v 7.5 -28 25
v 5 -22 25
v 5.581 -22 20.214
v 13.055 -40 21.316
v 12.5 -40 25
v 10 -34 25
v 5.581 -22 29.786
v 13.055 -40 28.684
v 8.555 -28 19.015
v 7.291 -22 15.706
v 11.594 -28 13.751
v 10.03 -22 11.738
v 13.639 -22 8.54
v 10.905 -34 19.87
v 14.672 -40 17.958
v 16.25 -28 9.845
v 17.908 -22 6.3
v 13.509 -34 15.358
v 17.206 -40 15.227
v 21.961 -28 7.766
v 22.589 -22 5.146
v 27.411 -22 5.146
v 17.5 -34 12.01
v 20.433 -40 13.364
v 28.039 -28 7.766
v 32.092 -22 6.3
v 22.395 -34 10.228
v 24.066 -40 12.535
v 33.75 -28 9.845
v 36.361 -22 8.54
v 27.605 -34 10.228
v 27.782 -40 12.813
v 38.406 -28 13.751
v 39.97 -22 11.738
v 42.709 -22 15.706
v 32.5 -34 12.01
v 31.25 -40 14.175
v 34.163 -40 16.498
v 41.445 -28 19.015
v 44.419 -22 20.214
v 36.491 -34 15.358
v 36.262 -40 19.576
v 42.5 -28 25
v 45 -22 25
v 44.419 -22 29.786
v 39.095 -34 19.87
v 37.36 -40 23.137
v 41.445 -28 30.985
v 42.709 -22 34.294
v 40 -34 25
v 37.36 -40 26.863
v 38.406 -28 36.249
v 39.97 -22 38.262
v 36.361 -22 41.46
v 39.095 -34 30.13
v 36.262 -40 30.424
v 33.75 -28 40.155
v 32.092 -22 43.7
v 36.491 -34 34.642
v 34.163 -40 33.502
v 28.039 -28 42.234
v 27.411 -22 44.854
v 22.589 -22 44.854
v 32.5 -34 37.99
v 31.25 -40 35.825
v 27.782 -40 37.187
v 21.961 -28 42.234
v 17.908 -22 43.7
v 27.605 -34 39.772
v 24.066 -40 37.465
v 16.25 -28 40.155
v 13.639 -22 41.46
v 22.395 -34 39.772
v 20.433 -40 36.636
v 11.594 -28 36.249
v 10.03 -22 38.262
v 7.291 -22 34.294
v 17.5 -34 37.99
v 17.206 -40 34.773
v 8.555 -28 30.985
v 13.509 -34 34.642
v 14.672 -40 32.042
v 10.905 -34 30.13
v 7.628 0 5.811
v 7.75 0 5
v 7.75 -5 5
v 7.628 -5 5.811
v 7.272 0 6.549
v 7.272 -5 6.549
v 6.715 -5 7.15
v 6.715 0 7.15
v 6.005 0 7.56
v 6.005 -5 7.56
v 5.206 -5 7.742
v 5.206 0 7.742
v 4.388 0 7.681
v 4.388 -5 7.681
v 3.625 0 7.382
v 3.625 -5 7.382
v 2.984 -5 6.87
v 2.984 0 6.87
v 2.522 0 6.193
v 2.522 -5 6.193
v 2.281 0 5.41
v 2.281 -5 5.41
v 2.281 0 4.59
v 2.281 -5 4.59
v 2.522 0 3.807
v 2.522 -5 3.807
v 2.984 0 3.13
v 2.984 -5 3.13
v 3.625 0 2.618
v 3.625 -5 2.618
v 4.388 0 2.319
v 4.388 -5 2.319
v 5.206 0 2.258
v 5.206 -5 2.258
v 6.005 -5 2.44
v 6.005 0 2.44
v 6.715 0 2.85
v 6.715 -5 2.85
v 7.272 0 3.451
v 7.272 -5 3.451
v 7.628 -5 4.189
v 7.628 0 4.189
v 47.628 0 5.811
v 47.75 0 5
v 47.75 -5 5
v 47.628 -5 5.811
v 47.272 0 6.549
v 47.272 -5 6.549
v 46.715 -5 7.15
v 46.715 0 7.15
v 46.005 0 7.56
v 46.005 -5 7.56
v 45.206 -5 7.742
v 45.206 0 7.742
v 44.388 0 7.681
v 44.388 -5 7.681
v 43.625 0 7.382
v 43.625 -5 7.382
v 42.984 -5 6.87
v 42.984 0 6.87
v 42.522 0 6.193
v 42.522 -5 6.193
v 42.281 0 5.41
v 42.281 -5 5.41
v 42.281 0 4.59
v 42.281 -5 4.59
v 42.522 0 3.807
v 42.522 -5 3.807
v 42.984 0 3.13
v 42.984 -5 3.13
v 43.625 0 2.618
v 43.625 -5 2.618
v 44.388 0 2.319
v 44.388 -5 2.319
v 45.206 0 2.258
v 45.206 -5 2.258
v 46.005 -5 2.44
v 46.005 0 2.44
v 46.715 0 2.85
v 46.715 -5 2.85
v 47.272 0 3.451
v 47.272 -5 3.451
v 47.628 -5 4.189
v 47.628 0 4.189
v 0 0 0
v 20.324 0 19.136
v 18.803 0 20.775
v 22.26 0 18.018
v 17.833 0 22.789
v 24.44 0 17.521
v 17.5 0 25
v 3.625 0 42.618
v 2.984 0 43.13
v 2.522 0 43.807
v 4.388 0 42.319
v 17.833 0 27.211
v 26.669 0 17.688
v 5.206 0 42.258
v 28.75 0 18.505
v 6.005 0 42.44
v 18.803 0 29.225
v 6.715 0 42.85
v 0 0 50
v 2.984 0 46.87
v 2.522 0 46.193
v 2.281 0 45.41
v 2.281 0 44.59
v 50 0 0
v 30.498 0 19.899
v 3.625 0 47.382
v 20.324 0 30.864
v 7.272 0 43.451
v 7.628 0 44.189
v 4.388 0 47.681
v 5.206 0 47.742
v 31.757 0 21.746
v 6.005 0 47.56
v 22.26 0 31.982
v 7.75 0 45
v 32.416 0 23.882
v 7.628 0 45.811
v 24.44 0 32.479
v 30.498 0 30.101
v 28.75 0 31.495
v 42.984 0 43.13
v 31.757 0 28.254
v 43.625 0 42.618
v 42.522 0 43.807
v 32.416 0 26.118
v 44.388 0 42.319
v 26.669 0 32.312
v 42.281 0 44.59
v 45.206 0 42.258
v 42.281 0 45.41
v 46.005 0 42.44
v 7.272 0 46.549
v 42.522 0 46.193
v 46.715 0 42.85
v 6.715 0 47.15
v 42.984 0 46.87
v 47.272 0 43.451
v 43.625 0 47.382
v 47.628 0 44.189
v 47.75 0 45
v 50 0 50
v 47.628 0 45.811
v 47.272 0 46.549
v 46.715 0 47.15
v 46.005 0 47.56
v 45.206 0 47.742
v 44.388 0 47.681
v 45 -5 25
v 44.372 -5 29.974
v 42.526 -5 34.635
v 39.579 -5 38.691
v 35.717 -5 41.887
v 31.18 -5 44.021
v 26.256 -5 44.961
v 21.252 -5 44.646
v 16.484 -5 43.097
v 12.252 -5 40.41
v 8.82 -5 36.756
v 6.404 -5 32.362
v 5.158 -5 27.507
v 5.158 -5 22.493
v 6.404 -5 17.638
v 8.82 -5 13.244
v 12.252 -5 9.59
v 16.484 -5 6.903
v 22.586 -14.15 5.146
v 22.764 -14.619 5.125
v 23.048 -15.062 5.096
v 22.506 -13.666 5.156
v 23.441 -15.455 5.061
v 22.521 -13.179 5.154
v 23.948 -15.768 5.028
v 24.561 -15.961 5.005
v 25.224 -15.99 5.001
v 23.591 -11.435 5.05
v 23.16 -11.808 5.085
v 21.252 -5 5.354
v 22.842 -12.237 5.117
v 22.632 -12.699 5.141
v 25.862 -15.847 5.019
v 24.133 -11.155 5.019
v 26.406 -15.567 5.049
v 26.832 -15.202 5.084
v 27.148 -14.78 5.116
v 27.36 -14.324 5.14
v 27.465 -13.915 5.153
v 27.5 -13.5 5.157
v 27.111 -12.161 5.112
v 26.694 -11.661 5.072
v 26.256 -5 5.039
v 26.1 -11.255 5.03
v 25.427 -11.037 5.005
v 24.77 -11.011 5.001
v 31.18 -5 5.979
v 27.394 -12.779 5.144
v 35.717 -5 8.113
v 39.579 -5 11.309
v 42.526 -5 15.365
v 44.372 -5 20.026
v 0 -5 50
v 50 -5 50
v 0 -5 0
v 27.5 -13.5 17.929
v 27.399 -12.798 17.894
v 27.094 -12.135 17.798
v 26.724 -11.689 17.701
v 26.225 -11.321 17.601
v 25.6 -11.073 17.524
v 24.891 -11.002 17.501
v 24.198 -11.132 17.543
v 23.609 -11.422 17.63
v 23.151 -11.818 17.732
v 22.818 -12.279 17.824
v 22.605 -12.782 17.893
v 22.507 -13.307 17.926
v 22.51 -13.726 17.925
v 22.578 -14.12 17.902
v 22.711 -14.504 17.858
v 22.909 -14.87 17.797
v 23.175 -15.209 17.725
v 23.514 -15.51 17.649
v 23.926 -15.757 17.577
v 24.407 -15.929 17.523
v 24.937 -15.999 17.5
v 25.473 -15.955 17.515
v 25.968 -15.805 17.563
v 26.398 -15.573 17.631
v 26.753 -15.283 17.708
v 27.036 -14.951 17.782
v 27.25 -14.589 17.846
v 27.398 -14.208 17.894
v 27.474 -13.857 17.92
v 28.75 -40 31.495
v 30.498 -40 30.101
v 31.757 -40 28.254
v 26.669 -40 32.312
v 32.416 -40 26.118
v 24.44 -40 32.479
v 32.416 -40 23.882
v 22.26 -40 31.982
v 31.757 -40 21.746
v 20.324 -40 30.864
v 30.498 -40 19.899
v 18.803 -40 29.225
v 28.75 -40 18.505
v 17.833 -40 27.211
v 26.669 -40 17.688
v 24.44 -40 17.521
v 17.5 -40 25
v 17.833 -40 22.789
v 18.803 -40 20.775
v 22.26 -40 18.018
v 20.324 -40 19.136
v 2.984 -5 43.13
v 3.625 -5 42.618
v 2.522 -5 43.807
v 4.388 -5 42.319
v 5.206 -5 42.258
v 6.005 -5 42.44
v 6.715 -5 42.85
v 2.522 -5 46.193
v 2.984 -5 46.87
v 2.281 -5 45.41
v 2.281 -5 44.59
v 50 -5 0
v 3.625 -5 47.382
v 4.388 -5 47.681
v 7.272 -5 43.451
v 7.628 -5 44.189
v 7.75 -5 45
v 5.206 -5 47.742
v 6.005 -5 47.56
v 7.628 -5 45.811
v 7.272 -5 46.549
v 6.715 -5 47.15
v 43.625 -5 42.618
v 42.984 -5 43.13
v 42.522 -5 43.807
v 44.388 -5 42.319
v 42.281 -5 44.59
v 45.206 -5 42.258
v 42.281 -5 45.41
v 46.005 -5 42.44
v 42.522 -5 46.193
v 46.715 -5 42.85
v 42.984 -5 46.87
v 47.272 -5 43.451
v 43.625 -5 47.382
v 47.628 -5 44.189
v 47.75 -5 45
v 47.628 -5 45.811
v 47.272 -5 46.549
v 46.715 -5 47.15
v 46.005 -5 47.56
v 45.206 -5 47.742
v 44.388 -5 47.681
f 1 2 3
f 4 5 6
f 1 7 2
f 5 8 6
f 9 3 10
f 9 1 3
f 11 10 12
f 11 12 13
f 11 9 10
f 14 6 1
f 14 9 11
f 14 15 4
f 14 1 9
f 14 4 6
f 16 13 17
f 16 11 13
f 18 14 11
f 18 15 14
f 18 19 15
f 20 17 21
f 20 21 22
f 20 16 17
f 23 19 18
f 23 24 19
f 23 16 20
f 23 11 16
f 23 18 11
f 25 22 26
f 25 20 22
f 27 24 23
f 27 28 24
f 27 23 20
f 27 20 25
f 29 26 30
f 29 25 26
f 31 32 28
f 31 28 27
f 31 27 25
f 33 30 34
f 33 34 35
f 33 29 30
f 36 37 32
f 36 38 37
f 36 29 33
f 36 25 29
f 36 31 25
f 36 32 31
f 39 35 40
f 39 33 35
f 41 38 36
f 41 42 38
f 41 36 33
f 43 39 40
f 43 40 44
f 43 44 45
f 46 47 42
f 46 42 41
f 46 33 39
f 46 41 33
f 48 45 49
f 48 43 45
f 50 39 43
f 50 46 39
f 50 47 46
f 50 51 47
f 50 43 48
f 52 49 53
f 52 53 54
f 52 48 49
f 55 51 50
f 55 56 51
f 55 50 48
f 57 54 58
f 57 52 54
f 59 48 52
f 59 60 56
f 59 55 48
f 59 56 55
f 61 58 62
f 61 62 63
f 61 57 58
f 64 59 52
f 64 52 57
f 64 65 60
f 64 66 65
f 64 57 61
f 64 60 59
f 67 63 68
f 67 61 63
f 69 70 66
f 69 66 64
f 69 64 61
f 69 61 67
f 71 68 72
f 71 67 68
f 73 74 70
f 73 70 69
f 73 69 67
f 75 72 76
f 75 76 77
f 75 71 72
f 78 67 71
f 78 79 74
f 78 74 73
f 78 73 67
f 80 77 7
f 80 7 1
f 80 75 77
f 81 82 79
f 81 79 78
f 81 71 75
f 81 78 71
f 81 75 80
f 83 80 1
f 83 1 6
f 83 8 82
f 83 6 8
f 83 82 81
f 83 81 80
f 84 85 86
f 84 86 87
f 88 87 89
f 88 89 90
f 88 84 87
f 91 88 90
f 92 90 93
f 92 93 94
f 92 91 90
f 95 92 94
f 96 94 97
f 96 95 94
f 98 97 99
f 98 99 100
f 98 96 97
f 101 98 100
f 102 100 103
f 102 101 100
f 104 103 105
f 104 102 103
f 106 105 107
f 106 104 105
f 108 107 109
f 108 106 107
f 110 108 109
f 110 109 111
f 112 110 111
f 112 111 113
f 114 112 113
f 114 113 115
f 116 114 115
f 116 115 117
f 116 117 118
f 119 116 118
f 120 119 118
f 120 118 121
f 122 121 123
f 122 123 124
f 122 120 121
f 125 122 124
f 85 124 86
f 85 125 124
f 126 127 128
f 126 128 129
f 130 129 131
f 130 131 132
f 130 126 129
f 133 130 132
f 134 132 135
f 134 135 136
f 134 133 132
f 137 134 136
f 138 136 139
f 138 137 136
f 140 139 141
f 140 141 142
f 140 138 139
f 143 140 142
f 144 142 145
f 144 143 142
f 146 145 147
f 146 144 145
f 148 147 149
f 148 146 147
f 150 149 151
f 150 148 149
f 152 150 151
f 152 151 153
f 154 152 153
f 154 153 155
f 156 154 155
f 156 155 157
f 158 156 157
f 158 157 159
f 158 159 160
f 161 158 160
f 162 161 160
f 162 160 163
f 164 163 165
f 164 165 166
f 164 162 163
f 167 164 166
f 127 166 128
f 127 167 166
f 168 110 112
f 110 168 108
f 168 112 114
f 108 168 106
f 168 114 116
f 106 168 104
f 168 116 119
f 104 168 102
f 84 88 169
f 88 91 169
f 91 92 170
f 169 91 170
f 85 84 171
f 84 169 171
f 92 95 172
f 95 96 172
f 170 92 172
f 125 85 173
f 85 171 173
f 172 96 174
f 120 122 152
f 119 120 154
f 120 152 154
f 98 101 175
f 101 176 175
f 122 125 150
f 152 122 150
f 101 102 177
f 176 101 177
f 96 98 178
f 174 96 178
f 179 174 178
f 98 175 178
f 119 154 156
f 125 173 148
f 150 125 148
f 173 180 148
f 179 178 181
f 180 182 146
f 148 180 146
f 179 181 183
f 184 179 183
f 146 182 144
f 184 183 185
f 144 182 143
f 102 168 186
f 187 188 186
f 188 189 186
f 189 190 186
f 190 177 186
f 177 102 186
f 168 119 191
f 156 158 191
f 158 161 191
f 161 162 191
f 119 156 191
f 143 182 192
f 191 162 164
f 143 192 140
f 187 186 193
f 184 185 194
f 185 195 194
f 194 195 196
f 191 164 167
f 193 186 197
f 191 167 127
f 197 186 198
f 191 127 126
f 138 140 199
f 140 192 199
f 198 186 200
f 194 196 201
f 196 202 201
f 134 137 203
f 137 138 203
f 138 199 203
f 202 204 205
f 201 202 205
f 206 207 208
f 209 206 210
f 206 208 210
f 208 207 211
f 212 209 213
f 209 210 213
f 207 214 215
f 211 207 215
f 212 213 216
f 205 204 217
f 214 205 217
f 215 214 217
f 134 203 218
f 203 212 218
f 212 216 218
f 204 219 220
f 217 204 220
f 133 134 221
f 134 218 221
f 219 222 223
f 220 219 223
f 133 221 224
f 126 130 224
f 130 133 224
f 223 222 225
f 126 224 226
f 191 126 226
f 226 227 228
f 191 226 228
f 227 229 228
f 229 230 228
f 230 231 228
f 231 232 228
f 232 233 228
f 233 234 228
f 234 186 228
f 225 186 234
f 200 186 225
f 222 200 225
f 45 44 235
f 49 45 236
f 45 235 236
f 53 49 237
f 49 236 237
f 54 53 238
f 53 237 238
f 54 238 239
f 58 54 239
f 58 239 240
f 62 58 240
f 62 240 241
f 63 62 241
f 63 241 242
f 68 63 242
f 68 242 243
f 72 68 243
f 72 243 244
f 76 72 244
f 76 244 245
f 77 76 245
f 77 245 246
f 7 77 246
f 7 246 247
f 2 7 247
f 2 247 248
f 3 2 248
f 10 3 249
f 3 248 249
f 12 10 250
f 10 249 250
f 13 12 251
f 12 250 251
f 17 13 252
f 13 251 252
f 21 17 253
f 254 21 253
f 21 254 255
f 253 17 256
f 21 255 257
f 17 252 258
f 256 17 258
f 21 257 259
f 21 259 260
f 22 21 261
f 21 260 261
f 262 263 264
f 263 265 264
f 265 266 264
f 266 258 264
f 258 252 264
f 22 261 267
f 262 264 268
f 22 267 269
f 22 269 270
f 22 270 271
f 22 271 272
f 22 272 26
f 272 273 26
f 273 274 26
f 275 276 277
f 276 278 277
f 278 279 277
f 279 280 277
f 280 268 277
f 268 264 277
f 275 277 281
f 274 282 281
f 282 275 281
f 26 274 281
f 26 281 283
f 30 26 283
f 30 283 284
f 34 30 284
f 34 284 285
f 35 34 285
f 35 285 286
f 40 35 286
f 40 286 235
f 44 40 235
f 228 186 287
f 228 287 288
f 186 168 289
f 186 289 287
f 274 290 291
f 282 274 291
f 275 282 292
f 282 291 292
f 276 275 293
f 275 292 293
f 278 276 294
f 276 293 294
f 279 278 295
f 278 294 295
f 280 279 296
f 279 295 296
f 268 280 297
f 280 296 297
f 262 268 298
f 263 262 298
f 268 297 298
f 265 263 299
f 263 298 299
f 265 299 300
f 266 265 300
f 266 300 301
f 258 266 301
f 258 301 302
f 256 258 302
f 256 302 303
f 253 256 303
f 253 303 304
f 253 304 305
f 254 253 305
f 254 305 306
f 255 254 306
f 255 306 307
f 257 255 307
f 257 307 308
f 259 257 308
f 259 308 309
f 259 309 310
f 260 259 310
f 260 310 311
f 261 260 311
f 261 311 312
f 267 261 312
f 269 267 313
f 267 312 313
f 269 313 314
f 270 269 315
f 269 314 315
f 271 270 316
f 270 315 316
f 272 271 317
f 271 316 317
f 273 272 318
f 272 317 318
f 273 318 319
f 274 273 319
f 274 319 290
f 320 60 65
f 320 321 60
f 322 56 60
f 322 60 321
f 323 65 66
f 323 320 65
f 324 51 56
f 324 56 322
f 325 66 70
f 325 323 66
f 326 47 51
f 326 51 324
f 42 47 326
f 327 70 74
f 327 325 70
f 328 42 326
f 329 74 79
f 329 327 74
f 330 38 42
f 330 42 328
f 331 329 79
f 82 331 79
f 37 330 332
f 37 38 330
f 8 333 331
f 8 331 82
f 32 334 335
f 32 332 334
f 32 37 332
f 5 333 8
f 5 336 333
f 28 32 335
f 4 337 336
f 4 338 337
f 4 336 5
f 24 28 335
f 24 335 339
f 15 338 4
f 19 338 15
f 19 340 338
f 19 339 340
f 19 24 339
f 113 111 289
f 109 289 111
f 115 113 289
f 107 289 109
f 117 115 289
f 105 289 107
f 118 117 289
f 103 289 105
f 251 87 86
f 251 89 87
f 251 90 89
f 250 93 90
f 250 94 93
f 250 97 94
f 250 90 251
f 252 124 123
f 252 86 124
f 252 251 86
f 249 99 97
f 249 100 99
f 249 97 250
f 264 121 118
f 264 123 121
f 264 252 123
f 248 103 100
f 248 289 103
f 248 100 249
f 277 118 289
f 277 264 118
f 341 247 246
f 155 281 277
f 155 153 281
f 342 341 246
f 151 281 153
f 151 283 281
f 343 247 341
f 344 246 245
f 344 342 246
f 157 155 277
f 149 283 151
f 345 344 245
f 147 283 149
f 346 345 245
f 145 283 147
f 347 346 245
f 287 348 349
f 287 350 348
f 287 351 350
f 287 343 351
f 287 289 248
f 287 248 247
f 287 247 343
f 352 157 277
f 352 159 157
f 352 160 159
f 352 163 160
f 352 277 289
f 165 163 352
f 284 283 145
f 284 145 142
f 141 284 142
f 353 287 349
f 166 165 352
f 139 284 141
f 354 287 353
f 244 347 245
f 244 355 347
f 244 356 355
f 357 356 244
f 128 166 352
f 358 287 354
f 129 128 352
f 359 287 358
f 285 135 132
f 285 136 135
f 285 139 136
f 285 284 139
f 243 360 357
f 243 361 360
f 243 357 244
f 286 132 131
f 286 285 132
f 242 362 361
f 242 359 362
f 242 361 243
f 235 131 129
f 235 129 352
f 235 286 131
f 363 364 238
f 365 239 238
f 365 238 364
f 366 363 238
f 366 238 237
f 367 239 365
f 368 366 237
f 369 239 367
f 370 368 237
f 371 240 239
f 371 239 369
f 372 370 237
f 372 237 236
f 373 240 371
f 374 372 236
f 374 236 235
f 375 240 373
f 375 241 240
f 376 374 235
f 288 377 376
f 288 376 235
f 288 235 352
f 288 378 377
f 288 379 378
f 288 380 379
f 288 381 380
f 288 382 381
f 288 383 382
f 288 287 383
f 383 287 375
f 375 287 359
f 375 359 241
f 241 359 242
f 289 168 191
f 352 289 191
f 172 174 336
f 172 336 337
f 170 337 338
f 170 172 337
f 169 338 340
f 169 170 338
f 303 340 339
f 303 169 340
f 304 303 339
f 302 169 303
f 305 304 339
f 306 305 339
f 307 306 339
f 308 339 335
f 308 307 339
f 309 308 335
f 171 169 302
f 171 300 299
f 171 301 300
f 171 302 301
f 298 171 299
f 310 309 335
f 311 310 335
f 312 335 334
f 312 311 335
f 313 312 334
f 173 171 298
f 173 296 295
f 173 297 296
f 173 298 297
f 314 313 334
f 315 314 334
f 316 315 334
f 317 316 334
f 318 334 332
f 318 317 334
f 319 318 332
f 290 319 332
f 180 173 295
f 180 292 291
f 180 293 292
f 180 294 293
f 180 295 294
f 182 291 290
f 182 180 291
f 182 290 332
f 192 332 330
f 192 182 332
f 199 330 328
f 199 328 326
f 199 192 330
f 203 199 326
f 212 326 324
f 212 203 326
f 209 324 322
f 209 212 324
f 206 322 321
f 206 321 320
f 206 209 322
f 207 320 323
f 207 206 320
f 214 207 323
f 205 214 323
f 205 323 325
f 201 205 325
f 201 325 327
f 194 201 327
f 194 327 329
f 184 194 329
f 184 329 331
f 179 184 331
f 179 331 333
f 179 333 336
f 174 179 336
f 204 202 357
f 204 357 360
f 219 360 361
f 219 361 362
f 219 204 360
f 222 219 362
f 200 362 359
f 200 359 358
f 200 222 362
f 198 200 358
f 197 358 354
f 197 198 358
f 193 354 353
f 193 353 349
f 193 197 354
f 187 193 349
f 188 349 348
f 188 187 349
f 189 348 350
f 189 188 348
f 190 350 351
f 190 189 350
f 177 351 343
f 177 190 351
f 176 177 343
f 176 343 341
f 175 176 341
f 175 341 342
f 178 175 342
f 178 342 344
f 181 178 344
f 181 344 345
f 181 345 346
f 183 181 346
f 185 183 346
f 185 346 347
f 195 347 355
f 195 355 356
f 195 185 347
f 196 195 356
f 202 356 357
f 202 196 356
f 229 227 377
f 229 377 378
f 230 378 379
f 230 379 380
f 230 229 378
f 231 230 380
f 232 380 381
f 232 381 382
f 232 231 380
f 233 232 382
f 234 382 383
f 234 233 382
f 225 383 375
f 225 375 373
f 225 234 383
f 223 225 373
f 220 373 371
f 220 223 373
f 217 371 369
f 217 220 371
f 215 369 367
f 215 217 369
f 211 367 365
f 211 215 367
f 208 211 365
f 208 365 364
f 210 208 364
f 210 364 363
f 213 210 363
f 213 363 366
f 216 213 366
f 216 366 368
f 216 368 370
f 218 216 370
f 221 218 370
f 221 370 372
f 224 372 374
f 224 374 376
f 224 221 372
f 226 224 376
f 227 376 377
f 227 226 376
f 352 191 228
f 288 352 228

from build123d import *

# Parameters (mm, degrees)
F0_W      = 50
F0_H      = 50
F0_R      = 2.75
F1_DEPTH  = 5
F2_R      = 20
F3_DEPTH  = 17
F7_R      = 7.5
F8_DEPTH  = 40.001
F9_R      = 2.5
F10_DEPTH = 25.001


with BuildPart() as f1:
    # F0 (on Front) → F1 (new body)
    with BuildSketch(Plane.XZ):
        with Locations((25, 25)):
            Rectangle(F0_W, F0_H)
        with Locations((5, 5)):
            Circle(F0_R, mode=Mode.SUBTRACT)
        with Locations((45, 5)):
            Circle(F0_R, mode=Mode.SUBTRACT)
        with Locations((5, 45)):
            Circle(F0_R, mode=Mode.SUBTRACT)
        with Locations((45, 45)):
            Circle(F0_R, mode=Mode.SUBTRACT)
    extrude(amount=F1_DEPTH)

    # F2 (on face) → F3 (join)
    with BuildSketch(Plane.XZ.offset(5)):
        with Locations((25, 25)):
            Circle(F2_R)
    extrude(amount=F3_DEPTH)

    # F5 (on offset) → F6 (revolve)
    with BuildSketch(Plane.XY.offset(25)):
        Polygon((12.5, -40), (17.5, -40), (17.5, -22), (5, -22), align=None)
    revolve(axis=Axis((25, -31, 25), (0, -1, 0)))

    # F7 (on face) → F8 (cut, through all)
    with BuildSketch(Plane(origin=(0, 0, 0), x_dir=(-1, 0, 0), z_dir=(0, 1, 0))):
        with Locations((-25, 25)):
            Circle(F7_R)
    extrude(amount=-F8_DEPTH, mode=Mode.SUBTRACT)

    # F9 (on offset) → F10 (cut, through all)
    with BuildSketch(Plane.XY.offset(25)):
        with Locations((25, -13.5)):
            Circle(F9_R)
    extrude(amount=-F10_DEPTH, mode=Mode.SUBTRACT)


solid = f1.part
